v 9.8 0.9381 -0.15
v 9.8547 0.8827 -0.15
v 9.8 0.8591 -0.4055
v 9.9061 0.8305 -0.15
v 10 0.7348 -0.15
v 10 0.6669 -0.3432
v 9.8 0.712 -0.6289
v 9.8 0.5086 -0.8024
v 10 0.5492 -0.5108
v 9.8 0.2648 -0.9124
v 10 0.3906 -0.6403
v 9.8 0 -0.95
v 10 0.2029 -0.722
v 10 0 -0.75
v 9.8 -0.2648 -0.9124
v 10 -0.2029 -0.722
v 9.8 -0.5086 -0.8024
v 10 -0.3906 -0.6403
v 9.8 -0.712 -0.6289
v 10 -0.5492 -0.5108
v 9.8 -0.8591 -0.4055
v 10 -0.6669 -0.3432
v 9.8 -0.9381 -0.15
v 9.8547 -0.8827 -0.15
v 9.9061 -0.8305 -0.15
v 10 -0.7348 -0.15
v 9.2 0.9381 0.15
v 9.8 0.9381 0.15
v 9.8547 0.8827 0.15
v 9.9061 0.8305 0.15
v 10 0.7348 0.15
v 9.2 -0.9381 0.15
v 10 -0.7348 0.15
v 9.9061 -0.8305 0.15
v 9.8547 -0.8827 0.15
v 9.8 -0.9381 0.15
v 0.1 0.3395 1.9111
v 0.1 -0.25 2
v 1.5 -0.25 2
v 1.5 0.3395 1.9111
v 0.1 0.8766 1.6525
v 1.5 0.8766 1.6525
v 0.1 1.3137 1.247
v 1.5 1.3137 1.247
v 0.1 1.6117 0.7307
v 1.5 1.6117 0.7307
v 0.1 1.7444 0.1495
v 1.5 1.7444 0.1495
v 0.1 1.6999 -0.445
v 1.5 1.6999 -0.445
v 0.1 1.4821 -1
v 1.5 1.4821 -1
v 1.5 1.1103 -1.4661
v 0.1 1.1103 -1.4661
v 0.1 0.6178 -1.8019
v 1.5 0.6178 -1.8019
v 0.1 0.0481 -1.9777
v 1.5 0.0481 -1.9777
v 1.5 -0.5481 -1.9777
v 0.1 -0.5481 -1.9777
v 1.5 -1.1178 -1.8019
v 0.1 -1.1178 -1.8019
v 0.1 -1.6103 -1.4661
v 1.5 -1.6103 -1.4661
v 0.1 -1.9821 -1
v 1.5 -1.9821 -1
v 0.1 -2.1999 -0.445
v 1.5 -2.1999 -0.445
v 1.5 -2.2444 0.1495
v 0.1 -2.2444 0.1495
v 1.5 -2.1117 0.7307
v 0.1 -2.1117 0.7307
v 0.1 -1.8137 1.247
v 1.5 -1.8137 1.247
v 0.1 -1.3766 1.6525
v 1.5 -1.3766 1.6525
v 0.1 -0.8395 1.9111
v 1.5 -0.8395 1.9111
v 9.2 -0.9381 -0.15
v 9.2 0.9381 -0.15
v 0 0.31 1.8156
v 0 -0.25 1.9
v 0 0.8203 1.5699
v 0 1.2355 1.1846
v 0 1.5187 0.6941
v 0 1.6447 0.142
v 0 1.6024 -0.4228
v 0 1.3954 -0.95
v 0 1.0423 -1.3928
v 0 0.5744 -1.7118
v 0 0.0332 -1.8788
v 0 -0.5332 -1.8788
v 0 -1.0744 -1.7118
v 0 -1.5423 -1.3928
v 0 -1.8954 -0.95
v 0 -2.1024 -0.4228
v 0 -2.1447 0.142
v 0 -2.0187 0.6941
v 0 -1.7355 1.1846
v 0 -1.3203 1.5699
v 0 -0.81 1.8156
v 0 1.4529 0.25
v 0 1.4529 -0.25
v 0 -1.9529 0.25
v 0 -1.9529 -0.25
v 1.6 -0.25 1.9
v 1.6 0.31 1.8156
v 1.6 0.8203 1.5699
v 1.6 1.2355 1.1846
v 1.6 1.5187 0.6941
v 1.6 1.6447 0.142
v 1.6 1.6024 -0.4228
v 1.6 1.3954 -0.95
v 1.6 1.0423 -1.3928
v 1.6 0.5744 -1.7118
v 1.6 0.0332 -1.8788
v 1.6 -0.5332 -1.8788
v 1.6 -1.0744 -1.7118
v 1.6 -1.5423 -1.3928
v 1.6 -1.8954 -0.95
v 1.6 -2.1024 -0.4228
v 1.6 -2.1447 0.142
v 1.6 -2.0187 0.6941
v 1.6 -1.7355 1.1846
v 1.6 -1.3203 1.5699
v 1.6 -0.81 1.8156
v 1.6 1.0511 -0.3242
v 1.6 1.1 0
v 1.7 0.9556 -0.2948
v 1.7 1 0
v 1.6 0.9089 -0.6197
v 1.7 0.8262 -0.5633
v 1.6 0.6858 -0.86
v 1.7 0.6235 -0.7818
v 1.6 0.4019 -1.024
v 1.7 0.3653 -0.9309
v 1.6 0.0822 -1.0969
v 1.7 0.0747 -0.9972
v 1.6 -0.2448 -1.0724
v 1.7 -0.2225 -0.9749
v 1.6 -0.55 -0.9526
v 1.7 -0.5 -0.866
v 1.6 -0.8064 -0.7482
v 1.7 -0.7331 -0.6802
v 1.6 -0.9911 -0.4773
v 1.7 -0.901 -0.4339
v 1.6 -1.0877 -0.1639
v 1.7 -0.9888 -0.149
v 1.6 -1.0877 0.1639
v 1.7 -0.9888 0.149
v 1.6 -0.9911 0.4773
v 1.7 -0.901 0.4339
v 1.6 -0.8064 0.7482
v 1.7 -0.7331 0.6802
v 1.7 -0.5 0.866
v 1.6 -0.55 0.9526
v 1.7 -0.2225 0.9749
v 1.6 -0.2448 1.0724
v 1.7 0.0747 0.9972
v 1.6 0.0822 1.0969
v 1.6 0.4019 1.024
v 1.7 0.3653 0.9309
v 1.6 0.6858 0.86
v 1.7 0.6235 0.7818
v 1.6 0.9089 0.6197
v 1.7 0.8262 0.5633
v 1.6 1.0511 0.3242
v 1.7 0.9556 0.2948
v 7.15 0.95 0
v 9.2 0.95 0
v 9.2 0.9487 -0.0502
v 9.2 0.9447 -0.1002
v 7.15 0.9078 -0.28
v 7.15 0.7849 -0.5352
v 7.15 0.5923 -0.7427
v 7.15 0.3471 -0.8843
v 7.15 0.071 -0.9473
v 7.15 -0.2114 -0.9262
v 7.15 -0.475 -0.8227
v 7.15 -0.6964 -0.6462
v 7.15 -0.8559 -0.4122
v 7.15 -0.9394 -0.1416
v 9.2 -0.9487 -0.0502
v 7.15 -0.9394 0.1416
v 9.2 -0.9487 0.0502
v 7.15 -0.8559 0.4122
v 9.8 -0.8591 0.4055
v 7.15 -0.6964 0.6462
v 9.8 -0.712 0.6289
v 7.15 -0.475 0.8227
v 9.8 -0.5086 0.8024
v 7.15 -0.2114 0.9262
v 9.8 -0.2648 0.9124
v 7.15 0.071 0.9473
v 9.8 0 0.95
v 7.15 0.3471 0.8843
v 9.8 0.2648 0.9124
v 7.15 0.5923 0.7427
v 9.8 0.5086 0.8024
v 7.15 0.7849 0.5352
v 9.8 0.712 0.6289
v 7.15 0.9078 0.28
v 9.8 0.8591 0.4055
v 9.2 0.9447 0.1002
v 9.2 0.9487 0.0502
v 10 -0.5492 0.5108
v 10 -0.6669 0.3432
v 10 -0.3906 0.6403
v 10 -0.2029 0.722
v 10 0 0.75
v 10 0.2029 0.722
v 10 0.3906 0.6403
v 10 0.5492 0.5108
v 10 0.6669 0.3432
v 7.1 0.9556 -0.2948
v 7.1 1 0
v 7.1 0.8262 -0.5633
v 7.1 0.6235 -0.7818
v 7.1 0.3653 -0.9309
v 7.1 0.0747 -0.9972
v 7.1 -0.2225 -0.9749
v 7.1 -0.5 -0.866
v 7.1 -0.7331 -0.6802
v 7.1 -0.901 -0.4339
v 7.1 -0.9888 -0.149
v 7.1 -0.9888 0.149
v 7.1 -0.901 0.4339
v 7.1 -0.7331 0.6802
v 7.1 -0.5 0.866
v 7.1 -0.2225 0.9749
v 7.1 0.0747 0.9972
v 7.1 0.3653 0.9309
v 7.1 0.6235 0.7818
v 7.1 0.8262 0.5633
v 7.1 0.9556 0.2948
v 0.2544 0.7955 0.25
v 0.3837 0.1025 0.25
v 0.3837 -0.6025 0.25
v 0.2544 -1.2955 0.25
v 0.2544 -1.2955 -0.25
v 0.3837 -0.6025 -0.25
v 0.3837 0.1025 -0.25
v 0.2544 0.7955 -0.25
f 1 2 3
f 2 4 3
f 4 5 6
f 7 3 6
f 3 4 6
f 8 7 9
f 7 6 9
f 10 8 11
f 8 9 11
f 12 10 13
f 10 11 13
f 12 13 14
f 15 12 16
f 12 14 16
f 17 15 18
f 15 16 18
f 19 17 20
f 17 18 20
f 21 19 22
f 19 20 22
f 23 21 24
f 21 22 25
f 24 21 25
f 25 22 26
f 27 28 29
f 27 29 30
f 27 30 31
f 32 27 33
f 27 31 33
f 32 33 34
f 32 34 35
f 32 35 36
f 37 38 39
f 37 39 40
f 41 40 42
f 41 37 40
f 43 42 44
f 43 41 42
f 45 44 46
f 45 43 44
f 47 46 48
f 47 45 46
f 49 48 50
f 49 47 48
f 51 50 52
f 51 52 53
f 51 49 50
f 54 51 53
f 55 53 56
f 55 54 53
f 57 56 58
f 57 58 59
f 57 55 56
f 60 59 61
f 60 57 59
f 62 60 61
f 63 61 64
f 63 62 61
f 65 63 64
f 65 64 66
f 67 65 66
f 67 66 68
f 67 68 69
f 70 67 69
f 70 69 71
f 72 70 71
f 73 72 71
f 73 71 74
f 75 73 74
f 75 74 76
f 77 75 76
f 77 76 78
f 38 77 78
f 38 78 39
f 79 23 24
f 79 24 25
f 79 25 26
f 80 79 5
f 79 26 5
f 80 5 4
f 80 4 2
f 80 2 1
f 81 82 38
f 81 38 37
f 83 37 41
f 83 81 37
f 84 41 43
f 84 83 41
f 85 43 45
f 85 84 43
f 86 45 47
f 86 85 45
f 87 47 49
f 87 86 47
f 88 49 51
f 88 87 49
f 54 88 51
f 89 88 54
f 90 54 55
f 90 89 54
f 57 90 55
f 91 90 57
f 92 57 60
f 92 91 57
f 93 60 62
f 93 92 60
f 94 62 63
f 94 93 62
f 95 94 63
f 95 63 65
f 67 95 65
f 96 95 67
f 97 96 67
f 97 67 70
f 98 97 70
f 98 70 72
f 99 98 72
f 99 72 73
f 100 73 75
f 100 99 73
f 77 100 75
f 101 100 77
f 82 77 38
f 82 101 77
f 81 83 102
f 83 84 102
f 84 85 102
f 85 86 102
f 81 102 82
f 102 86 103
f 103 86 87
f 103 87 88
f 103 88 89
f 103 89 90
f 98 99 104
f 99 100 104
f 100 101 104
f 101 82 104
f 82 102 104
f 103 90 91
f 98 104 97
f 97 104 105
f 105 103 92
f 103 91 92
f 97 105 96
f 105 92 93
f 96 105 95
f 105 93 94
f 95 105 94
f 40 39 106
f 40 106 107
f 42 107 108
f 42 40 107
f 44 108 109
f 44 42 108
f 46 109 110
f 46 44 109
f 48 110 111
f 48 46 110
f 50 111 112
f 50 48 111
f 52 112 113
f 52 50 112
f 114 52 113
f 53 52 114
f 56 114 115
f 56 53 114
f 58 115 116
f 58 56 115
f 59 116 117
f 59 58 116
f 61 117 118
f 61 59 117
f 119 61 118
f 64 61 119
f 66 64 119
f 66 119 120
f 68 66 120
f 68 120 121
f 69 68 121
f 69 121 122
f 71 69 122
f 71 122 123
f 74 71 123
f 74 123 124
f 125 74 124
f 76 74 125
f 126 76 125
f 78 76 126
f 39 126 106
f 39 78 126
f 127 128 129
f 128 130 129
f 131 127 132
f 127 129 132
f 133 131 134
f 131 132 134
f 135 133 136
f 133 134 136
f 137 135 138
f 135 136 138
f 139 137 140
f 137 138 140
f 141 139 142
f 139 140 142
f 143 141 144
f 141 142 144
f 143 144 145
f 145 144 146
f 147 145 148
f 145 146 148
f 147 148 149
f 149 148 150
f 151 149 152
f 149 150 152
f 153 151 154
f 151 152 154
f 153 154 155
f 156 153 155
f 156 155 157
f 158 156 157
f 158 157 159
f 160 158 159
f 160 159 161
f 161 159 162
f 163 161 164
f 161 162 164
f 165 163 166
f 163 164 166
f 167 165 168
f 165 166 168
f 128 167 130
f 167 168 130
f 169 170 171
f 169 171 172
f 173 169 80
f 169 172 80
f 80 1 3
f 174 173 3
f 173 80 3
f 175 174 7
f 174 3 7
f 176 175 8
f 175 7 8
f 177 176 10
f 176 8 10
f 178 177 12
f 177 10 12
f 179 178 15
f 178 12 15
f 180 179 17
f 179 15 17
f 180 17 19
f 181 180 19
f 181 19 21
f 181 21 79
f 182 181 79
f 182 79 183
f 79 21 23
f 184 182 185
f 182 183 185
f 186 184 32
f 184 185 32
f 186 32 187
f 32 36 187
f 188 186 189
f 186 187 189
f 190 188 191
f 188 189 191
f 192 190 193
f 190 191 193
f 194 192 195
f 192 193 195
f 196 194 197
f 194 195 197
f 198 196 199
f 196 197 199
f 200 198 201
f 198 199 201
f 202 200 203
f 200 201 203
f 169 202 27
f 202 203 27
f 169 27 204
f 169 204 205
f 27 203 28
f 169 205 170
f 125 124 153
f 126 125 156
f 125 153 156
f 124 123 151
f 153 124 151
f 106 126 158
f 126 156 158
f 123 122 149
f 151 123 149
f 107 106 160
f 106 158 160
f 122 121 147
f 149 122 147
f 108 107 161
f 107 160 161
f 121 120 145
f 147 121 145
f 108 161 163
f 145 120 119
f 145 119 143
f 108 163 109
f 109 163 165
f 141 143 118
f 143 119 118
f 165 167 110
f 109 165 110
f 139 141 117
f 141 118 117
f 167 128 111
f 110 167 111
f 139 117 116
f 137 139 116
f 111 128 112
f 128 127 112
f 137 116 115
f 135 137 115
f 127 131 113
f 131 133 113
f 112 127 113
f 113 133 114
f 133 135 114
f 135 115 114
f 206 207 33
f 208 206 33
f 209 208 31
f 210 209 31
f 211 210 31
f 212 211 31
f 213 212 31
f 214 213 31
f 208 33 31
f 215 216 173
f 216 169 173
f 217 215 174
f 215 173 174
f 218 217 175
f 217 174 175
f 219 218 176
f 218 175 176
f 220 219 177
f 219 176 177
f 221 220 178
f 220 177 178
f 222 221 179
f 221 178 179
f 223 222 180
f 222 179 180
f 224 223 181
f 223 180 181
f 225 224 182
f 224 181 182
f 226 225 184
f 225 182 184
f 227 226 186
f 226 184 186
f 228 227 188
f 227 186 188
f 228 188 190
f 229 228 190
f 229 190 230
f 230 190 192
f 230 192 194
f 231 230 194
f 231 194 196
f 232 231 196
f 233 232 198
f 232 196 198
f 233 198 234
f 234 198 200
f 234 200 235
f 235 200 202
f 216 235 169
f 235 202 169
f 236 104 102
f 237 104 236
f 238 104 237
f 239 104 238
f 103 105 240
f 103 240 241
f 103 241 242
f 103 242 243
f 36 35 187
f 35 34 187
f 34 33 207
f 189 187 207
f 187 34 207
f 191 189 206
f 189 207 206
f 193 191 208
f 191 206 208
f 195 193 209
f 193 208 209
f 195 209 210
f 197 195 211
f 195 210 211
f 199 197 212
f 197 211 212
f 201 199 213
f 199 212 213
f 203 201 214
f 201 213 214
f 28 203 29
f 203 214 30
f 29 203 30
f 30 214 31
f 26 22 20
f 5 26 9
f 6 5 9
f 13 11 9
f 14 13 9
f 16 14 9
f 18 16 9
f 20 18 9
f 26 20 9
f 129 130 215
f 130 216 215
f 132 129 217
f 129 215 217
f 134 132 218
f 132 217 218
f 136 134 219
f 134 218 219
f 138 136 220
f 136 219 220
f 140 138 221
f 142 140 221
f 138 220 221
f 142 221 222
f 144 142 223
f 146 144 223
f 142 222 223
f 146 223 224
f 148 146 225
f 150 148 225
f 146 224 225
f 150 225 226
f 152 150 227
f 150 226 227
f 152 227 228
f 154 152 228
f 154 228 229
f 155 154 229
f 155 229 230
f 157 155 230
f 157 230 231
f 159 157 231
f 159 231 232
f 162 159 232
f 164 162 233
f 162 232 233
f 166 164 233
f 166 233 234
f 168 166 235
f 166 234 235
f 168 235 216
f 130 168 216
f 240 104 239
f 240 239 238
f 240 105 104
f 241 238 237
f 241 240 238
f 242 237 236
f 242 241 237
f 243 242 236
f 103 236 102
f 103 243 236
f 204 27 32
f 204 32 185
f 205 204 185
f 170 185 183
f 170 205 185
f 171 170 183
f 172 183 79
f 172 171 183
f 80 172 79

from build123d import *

# Parameters (mm, degrees)
CUT_EXTRUDE_5_REACH      = 12
SKETCH_2_R               = 2.5
SKETCH_2_R_2             = 2
CUT_EXTRUDE_8_DEPTH      = 0.8
CHAMFER_1_SIZE           = 0.2
CHAMFER_2_SIZE           = 0.1
SKETCH_4_R               = 3.825
CUT_EXTRUDE_9_DEPTH      = 0.25
CUT_EXTRUDE_9_DEPTH_BACK = 0.25


with BuildPart() as part:
    # Эскиз1 → Повернуть1 (revolve)
    with BuildSketch(Plane.XY):
        Polygon((0, 0), (0, 2.5), (1.6, 2.5), (1.6, 1.1), (1.7, 1), (7.1, 1), (7.15, 0.95), (10, 0.95), (10, 0), align=None)
    revolve(axis=Axis((0, 0, 0), (-1, 0, 0)))

    # Эскиз2 → Вырез-Вытянуть5 (cut, up to next)
    with BuildSketch(Plane.ZY, mode=Mode.PRIVATE) as cut_extrude_5_sk1:
        Circle(SKETCH_2_R)
        with Locations((0, -0.25)):
            Circle(SKETCH_2_R_2, mode=Mode.SUBTRACT)
    cut_extrude_5_tool1 = extrude(cut_extrude_5_sk1.sketch, amount=-CUT_EXTRUDE_5_REACH, mode=Mode.PRIVATE) & part.part
    add(cut_extrude_5_tool1.solids().sort_by_distance((0, 0, -2.429289))[0], mode=Mode.SUBTRACT)

    # Эскиз3 → Вырез-Вытянуть8 (cut)
    with BuildSketch(Plane(origin=(10, 0, 0), x_dir=(0, 0, -1), z_dir=(1, 0, 0))):
        with BuildLine():
            ThreePointArc((0.15, 0.938083152), (0, 0.95), (-0.15, 0.938083152))
            Line((-0.15, 0.938083152), (-0.15, -0.938083152))
            ThreePointArc((-0.15, -0.938083152), (0, -0.95), (0.15, -0.938083152))
            Line((0.15, -0.938083152), (0.15, 0.938083152))
        make_face()
    extrude(amount=-CUT_EXTRUDE_8_DEPTH, mode=Mode.SUBTRACT)

    # Фаска1
    chamfer_1_edges = [part.edges().sort_by_distance(p)[0] for p in [
        (10, 0, 0.95),
        (10, 0, -0.95),
    ]]
    chamfer(chamfer_1_edges, length=CHAMFER_1_SIZE)

    # Фаска2
    chamfer_2_edges = [part.edges().sort_by_distance(p)[0] for p in [
        (0, -0.25, -2),
        (1.6, -0.25, -2),
    ]]
    chamfer(chamfer_2_edges, length=CHAMFER_2_SIZE)

    # Эскиз4 → Вырез-Вытянуть9 (cut, two sides)
    with BuildSketch(Plane.XY) as cut_extrude_9_sk:
        with Locations((-3.425, -0.25)):
            Circle(SKETCH_4_R)
    extrude(amount=CUT_EXTRUDE_9_DEPTH, mode=Mode.SUBTRACT)
    extrude(cut_extrude_9_sk.sketch, amount=-CUT_EXTRUDE_9_DEPTH_BACK, mode=Mode.SUBTRACT)


solid = part.part
